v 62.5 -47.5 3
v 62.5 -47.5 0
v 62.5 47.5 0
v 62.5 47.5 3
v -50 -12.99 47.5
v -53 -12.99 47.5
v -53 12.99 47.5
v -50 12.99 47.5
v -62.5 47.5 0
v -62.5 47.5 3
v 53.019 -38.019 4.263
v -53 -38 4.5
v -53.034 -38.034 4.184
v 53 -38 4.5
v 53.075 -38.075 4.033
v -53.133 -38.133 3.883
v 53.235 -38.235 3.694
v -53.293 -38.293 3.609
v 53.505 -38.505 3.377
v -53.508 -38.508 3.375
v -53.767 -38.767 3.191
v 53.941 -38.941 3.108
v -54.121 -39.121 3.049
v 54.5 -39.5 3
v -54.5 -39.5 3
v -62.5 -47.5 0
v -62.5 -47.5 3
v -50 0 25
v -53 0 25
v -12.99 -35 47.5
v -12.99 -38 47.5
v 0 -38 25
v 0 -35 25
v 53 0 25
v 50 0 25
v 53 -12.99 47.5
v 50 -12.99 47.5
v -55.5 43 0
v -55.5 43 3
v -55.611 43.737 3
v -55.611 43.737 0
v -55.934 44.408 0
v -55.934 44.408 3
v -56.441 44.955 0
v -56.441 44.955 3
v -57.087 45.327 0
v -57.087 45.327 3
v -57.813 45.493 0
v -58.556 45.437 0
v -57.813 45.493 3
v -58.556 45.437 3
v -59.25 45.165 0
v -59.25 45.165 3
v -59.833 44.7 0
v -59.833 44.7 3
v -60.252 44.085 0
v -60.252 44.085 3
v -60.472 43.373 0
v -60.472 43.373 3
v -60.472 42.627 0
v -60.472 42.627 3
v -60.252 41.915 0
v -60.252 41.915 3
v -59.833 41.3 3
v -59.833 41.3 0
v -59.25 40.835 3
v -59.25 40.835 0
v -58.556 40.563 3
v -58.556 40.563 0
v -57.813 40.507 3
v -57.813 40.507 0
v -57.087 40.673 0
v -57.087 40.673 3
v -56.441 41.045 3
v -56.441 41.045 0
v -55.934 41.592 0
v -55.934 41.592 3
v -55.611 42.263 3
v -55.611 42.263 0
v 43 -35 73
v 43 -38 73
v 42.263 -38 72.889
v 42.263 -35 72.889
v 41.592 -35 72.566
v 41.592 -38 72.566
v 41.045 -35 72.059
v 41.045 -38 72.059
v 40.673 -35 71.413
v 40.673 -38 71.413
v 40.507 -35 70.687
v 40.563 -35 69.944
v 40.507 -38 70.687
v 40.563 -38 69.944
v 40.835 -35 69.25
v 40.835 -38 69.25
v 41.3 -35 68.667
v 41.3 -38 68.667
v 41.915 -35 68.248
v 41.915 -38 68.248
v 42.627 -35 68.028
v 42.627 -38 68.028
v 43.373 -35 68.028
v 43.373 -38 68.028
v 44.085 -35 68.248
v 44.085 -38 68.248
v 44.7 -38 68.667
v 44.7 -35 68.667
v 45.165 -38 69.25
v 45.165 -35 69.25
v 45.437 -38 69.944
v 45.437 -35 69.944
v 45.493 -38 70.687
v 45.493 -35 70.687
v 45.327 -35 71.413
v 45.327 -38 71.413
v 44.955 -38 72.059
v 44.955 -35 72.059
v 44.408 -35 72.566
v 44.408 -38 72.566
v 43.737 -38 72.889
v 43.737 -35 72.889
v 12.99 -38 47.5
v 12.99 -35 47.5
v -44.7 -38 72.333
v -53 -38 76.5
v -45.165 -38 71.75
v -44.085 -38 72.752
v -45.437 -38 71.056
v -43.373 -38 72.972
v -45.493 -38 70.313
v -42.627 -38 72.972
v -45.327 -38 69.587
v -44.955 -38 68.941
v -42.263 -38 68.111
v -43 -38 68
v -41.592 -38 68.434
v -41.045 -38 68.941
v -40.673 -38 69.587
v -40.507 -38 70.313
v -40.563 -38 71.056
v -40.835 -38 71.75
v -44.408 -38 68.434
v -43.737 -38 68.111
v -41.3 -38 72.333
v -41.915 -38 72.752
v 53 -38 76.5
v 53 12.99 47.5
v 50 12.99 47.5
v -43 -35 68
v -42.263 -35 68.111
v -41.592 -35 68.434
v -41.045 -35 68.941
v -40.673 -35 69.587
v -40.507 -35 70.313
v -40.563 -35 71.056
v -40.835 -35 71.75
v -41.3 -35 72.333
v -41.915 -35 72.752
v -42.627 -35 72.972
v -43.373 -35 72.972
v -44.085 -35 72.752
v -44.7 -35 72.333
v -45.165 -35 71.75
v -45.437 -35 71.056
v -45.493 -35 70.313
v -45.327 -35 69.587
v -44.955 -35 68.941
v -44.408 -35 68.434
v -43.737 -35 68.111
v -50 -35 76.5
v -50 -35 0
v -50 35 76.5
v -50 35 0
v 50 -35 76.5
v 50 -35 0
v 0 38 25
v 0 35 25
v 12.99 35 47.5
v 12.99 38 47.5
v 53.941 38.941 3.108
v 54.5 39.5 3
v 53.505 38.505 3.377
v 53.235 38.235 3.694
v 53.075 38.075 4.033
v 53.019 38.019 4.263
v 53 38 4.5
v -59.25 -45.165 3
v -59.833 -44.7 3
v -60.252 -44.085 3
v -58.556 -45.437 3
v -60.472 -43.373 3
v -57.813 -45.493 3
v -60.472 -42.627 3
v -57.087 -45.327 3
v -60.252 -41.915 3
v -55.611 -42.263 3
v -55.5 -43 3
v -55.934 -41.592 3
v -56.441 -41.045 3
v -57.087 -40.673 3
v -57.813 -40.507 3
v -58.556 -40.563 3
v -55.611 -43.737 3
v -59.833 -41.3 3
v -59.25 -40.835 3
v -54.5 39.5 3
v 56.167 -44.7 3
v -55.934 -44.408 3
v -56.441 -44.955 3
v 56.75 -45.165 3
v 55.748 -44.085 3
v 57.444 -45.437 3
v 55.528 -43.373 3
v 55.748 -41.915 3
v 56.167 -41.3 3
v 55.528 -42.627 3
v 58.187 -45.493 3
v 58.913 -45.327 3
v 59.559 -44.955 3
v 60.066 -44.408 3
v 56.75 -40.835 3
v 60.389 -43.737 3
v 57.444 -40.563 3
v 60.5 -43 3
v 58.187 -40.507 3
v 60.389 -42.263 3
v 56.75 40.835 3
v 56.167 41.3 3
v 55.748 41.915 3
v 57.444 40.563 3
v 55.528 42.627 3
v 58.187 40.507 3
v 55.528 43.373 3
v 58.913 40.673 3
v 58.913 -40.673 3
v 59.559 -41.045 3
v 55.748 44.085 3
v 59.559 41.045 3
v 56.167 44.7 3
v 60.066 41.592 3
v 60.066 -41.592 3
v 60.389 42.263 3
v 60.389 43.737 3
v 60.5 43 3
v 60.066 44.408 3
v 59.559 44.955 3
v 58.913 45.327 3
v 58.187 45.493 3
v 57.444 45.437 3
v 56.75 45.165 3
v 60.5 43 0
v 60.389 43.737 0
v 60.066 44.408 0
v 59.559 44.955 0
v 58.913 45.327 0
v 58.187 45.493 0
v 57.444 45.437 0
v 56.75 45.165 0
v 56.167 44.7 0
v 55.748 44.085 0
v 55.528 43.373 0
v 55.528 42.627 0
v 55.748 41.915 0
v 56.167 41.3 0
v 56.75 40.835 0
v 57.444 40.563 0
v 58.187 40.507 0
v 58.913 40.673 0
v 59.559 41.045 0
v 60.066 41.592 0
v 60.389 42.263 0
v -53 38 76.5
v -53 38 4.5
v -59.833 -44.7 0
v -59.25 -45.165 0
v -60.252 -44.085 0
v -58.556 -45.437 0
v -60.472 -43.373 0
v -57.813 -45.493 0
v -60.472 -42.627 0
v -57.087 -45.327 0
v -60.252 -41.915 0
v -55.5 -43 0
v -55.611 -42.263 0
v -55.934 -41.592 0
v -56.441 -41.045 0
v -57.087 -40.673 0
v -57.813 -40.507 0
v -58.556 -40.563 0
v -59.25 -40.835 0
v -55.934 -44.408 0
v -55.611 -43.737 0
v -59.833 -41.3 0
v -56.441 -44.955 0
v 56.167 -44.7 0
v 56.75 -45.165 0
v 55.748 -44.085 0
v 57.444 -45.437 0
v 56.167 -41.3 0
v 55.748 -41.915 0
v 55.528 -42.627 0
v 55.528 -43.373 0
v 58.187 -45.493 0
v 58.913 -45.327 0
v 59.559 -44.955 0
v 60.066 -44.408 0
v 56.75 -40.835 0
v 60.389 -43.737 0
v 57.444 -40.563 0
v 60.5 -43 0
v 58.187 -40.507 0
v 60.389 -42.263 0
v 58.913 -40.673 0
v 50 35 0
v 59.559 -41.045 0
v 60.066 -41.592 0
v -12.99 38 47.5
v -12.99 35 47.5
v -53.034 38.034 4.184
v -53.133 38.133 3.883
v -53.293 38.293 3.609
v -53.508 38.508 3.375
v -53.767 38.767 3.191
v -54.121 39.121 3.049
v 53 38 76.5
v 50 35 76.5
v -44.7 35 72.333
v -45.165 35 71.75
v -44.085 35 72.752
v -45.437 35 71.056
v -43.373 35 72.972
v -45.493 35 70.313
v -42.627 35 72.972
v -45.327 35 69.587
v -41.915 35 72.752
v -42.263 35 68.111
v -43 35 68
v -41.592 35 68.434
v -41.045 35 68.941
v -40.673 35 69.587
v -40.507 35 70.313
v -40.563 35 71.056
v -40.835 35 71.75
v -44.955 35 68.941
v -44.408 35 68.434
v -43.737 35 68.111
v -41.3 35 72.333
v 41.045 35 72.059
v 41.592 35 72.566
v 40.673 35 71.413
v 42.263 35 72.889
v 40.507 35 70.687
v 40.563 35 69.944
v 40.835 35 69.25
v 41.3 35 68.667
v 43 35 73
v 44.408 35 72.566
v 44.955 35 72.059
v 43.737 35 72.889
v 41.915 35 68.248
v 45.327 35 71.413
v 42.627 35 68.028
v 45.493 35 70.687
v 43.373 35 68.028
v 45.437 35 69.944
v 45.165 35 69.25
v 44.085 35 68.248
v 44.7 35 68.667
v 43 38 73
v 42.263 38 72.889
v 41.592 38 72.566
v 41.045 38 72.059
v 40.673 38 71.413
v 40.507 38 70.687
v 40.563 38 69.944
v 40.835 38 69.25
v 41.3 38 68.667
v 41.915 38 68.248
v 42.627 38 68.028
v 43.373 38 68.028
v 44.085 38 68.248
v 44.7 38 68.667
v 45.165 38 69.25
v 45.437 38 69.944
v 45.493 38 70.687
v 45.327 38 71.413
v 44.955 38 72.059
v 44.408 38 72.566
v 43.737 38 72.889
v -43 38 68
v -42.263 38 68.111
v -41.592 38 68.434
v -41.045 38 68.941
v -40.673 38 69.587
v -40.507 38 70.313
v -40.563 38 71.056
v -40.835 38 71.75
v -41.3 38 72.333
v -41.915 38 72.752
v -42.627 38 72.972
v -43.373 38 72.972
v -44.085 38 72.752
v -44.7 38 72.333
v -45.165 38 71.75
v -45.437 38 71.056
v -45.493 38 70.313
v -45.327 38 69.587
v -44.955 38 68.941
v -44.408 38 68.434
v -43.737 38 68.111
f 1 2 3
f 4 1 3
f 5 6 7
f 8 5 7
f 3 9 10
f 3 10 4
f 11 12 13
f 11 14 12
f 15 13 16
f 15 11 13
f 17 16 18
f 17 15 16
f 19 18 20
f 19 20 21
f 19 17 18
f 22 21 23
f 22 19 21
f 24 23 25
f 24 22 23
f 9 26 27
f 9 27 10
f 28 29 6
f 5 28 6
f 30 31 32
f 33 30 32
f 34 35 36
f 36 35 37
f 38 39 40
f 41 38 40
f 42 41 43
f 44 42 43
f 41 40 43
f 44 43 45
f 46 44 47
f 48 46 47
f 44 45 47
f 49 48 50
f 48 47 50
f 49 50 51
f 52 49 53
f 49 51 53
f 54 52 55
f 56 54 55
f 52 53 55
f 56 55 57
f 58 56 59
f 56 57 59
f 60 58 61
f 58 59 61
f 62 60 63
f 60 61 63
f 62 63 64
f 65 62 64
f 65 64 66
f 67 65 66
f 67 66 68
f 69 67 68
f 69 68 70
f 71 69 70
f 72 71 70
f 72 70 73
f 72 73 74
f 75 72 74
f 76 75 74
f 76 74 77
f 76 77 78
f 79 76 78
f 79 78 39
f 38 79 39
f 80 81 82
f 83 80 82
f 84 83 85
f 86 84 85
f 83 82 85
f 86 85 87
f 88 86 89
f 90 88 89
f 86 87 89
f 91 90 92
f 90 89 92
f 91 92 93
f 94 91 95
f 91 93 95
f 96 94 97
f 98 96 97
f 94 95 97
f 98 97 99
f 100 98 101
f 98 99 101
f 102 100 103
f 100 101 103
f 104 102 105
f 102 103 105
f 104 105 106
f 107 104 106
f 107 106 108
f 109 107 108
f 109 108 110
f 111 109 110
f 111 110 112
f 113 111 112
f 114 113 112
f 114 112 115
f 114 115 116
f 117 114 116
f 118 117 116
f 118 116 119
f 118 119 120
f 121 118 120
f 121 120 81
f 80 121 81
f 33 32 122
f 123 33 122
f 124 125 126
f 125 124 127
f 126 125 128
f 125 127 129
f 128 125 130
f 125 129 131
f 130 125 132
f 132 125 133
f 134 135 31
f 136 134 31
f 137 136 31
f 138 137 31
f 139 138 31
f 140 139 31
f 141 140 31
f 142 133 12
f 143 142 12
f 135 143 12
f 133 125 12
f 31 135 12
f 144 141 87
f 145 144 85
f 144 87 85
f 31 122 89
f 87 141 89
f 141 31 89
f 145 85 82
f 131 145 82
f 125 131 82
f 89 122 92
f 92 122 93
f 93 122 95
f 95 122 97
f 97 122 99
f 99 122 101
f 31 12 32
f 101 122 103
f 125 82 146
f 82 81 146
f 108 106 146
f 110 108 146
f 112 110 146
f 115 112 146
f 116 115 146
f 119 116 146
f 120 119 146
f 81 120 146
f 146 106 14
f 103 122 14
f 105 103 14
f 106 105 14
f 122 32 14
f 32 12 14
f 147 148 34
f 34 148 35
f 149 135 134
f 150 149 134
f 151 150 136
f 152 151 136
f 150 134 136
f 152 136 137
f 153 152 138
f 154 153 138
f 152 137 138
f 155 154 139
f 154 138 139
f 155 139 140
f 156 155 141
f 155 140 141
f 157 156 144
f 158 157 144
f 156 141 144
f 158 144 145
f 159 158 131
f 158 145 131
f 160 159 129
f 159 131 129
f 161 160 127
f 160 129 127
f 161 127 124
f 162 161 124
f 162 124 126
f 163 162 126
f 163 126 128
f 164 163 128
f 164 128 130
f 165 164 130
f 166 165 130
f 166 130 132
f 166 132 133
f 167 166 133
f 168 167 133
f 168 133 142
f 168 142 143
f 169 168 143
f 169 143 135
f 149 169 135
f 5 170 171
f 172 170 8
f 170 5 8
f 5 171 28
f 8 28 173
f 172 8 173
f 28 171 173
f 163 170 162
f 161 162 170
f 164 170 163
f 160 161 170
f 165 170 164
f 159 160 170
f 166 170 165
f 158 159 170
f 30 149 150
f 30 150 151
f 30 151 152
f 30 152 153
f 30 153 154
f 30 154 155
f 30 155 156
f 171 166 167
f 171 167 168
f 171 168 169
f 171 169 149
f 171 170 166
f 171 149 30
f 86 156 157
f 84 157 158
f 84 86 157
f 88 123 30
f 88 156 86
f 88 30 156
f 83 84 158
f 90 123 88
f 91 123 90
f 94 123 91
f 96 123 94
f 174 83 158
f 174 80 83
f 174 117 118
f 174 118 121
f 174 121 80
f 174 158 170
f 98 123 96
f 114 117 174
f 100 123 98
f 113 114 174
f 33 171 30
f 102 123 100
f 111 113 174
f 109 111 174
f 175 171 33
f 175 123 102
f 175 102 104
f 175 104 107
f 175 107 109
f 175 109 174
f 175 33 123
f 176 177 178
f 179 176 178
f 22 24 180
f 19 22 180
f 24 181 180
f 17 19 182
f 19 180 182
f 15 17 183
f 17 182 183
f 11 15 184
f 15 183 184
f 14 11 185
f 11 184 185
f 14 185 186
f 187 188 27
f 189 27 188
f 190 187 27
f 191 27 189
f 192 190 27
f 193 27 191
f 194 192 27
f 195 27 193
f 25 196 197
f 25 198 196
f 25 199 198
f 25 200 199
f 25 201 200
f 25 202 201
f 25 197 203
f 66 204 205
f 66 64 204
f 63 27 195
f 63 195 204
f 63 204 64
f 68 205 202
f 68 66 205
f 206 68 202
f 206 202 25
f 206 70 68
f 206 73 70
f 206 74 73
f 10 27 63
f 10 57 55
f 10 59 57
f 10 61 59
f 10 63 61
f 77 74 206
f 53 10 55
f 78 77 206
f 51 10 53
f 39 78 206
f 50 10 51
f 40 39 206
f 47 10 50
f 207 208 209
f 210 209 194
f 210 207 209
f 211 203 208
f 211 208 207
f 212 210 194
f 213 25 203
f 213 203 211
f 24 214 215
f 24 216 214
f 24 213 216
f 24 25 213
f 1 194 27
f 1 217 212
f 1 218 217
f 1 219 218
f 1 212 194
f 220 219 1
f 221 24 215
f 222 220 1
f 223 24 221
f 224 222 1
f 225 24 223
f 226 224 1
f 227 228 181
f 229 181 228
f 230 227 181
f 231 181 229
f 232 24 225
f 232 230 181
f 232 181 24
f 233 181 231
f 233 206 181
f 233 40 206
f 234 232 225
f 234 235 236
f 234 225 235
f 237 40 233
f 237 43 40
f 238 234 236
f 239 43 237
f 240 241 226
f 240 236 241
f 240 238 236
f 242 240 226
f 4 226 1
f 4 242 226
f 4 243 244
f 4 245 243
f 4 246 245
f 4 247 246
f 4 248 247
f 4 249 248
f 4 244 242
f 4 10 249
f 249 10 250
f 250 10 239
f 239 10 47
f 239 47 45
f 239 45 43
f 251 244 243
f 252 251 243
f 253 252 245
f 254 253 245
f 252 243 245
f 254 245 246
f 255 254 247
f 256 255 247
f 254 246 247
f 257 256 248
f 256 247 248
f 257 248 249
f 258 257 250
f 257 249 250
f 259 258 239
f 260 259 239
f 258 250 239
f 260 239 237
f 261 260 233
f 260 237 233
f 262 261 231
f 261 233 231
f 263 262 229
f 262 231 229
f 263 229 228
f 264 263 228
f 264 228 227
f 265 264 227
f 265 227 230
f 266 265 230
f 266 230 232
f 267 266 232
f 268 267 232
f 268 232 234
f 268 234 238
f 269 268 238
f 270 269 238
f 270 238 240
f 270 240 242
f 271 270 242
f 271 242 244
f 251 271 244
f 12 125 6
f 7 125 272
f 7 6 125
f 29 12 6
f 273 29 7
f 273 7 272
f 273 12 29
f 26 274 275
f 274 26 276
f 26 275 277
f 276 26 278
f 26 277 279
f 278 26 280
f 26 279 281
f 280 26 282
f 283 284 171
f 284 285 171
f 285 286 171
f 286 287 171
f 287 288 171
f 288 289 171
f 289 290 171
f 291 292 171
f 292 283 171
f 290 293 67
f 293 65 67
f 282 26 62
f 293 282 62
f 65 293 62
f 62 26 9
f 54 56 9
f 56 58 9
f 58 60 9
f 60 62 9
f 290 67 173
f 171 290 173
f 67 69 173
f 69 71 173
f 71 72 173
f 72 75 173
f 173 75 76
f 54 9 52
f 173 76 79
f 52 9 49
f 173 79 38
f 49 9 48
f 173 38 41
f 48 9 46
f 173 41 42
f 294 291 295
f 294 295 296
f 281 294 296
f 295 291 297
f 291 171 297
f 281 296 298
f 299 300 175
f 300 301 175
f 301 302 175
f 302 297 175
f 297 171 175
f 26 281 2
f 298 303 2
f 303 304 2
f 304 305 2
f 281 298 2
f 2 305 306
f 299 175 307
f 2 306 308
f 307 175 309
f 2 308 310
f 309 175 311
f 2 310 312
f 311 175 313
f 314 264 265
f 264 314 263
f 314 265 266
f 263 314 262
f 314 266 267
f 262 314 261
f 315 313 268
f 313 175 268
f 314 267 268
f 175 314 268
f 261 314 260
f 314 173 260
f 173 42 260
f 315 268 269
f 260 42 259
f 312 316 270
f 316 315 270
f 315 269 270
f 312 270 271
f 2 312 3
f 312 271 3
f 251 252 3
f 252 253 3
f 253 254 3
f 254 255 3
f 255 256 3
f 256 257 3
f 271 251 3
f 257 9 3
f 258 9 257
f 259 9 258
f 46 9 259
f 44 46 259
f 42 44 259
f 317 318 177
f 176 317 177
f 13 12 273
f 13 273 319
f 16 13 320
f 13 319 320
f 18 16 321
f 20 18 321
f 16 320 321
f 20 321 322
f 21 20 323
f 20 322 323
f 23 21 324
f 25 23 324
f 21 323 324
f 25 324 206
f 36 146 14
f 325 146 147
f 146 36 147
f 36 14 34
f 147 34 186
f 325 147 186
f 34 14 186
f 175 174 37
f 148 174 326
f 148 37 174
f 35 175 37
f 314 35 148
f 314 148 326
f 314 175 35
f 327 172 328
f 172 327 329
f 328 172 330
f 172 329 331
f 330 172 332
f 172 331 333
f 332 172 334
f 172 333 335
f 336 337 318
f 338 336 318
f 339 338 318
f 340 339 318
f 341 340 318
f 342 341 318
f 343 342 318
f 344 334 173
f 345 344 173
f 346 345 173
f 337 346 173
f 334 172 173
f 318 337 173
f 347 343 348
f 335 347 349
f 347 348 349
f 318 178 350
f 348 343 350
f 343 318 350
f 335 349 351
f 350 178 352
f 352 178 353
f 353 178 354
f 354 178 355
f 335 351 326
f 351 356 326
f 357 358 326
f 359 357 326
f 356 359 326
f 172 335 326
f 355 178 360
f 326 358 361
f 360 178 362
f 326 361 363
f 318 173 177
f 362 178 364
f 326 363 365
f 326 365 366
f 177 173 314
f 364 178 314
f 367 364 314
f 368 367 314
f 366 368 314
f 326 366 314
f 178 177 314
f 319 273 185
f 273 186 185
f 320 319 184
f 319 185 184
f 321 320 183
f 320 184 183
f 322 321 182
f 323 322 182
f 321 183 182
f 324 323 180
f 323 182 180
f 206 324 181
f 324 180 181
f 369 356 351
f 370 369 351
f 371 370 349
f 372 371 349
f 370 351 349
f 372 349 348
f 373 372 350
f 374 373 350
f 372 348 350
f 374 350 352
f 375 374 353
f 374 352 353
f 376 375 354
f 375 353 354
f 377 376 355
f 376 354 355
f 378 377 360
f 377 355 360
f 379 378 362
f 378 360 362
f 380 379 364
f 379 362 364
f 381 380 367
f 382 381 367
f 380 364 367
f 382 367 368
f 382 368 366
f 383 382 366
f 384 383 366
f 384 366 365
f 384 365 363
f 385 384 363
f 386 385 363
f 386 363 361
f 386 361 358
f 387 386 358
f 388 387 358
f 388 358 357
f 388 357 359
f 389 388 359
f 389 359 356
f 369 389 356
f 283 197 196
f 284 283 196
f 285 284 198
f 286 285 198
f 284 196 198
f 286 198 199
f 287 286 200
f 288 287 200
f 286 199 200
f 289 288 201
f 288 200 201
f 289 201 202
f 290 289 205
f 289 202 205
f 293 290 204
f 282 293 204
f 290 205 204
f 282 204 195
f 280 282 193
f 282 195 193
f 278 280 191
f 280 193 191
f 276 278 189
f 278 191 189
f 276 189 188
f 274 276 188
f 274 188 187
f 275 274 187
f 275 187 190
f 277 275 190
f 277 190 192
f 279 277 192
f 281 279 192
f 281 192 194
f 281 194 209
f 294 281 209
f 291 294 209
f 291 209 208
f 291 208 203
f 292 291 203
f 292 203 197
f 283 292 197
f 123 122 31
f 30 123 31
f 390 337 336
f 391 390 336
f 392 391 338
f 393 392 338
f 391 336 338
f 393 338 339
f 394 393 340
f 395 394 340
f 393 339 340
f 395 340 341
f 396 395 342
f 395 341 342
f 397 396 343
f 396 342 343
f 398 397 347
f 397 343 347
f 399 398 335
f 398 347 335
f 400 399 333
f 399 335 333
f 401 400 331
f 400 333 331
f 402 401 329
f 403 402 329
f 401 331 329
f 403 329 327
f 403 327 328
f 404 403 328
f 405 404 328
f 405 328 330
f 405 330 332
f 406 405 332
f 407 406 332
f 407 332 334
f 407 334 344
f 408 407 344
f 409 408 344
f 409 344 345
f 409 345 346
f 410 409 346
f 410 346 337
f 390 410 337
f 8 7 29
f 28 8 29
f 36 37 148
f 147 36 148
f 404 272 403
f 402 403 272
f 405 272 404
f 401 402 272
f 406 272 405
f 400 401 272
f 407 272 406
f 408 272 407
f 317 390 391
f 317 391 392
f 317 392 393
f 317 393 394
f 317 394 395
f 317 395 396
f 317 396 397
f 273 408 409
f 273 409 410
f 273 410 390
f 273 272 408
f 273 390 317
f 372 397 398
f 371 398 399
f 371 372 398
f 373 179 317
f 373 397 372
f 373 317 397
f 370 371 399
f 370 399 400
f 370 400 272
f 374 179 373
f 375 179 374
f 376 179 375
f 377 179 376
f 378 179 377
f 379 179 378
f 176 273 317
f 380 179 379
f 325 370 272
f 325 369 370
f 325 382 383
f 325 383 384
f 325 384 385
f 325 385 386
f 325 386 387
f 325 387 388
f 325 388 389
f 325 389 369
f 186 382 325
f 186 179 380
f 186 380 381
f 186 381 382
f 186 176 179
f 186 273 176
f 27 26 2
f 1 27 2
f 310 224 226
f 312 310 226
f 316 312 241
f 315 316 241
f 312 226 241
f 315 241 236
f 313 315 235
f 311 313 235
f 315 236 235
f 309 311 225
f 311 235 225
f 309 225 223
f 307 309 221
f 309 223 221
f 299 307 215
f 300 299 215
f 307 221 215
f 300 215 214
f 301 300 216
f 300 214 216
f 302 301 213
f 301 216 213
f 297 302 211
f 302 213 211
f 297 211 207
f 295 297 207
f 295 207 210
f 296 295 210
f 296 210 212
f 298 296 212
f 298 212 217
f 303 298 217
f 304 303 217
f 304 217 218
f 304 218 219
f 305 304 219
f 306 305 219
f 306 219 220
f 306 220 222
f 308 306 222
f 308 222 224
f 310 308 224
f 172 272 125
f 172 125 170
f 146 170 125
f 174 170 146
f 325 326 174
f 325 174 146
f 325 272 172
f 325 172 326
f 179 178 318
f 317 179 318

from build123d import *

# Parameters (mm, degrees)
SKETCH_1_W          = 125
SKETCH_1_H          = 95
SKETCH_1_W_2        = 100
SKETCH_1_H_2        = 70
EXTRUDE_1_DEPTH     = 3
SKETCH_2_W          = 106
SKETCH_2_H          = 76
SKETCH_2_W_2        = 100
SKETCH_2_H_2        = 70
EXTRUDE_2_DEPTH     = 73.5
SKETCH_3_R          = 2.5
CUT_EXTRUDE_1_DEPTH = 113.5
FILLET_1_R          = 1.5
SKETCH_4_R          = 2.5
CUT_EXTRUDE_2_DEPTH = 113.5
CUT_EXTRUDE_3_DEPTH = 113.5
CUT_EXTRUDE_4_DEPTH = 113.5


with BuildPart() as part:
    # 草图1 → 凸台-拉伸1 (new body)
    with BuildSketch(Plane.XY):
        Rectangle(SKETCH_1_W, SKETCH_1_H)
        Rectangle(SKETCH_1_W_2, SKETCH_1_H_2, mode=Mode.SUBTRACT)
    extrude(amount=EXTRUDE_1_DEPTH)

    # 草图2 → 凸台-拉伸2 (add)
    with BuildSketch(Plane.XY.offset(3)):
        Rectangle(SKETCH_2_W, SKETCH_2_H)
        Rectangle(SKETCH_2_W_2, SKETCH_2_H_2, mode=Mode.SUBTRACT)
    extrude(amount=EXTRUDE_2_DEPTH)

    # 草图3 → 切除-拉伸1 (cut)
    with BuildSketch(Plane.XZ.offset(38)):
        with Locations(Location((-43, 70.5, 0), (0, 0, 270))):
            Circle(SKETCH_3_R)
        with Locations(Location((43, 70.5, 0), (0, 0, 90))):
            Circle(SKETCH_3_R)
    extrude(amount=-CUT_EXTRUDE_1_DEPTH, mode=Mode.SUBTRACT)

    # 圆角1
    fillet_1_edges = [part.edges().sort_by_distance(p)[0] for p in [
        (53, 0, 3),
        (0, 38, 3),
        (-53, 0, 3),
        (0, -38, 3),
    ]]
    fillet(fillet_1_edges, radius=FILLET_1_R)

    # 草图4 → 切除-拉伸2 (cut)
    with BuildSketch(Plane.XY.offset(3)):
        with Locations((-58, 43)):
            Circle(SKETCH_4_R)
        with Locations((58, 43)):
            Circle(SKETCH_4_R)
        with Locations((58, -43)):
            Circle(SKETCH_4_R)
        with Locations((-58, -43)):
            Circle(SKETCH_4_R)
    extrude(amount=-CUT_EXTRUDE_2_DEPTH, mode=Mode.SUBTRACT)

    # 草图5 → 切除-拉伸3 (cut)
    with BuildSketch(Plane.XZ.offset(38)):
        Polygon((0, 25), (12.990381057, 47.5), (-12.990381057, 47.5), align=None)
    extrude(amount=-CUT_EXTRUDE_3_DEPTH, mode=Mode.SUBTRACT)

    # 草图6 → 切除-拉伸4 (cut)
    with BuildSketch(Plane.ZY.offset(53)):
        Polygon((25, 0), (47.5, -12.990381057), (47.5, 12.990381057), align=None)
    extrude(amount=-CUT_EXTRUDE_4_DEPTH, mode=Mode.SUBTRACT)


solid = part.part
